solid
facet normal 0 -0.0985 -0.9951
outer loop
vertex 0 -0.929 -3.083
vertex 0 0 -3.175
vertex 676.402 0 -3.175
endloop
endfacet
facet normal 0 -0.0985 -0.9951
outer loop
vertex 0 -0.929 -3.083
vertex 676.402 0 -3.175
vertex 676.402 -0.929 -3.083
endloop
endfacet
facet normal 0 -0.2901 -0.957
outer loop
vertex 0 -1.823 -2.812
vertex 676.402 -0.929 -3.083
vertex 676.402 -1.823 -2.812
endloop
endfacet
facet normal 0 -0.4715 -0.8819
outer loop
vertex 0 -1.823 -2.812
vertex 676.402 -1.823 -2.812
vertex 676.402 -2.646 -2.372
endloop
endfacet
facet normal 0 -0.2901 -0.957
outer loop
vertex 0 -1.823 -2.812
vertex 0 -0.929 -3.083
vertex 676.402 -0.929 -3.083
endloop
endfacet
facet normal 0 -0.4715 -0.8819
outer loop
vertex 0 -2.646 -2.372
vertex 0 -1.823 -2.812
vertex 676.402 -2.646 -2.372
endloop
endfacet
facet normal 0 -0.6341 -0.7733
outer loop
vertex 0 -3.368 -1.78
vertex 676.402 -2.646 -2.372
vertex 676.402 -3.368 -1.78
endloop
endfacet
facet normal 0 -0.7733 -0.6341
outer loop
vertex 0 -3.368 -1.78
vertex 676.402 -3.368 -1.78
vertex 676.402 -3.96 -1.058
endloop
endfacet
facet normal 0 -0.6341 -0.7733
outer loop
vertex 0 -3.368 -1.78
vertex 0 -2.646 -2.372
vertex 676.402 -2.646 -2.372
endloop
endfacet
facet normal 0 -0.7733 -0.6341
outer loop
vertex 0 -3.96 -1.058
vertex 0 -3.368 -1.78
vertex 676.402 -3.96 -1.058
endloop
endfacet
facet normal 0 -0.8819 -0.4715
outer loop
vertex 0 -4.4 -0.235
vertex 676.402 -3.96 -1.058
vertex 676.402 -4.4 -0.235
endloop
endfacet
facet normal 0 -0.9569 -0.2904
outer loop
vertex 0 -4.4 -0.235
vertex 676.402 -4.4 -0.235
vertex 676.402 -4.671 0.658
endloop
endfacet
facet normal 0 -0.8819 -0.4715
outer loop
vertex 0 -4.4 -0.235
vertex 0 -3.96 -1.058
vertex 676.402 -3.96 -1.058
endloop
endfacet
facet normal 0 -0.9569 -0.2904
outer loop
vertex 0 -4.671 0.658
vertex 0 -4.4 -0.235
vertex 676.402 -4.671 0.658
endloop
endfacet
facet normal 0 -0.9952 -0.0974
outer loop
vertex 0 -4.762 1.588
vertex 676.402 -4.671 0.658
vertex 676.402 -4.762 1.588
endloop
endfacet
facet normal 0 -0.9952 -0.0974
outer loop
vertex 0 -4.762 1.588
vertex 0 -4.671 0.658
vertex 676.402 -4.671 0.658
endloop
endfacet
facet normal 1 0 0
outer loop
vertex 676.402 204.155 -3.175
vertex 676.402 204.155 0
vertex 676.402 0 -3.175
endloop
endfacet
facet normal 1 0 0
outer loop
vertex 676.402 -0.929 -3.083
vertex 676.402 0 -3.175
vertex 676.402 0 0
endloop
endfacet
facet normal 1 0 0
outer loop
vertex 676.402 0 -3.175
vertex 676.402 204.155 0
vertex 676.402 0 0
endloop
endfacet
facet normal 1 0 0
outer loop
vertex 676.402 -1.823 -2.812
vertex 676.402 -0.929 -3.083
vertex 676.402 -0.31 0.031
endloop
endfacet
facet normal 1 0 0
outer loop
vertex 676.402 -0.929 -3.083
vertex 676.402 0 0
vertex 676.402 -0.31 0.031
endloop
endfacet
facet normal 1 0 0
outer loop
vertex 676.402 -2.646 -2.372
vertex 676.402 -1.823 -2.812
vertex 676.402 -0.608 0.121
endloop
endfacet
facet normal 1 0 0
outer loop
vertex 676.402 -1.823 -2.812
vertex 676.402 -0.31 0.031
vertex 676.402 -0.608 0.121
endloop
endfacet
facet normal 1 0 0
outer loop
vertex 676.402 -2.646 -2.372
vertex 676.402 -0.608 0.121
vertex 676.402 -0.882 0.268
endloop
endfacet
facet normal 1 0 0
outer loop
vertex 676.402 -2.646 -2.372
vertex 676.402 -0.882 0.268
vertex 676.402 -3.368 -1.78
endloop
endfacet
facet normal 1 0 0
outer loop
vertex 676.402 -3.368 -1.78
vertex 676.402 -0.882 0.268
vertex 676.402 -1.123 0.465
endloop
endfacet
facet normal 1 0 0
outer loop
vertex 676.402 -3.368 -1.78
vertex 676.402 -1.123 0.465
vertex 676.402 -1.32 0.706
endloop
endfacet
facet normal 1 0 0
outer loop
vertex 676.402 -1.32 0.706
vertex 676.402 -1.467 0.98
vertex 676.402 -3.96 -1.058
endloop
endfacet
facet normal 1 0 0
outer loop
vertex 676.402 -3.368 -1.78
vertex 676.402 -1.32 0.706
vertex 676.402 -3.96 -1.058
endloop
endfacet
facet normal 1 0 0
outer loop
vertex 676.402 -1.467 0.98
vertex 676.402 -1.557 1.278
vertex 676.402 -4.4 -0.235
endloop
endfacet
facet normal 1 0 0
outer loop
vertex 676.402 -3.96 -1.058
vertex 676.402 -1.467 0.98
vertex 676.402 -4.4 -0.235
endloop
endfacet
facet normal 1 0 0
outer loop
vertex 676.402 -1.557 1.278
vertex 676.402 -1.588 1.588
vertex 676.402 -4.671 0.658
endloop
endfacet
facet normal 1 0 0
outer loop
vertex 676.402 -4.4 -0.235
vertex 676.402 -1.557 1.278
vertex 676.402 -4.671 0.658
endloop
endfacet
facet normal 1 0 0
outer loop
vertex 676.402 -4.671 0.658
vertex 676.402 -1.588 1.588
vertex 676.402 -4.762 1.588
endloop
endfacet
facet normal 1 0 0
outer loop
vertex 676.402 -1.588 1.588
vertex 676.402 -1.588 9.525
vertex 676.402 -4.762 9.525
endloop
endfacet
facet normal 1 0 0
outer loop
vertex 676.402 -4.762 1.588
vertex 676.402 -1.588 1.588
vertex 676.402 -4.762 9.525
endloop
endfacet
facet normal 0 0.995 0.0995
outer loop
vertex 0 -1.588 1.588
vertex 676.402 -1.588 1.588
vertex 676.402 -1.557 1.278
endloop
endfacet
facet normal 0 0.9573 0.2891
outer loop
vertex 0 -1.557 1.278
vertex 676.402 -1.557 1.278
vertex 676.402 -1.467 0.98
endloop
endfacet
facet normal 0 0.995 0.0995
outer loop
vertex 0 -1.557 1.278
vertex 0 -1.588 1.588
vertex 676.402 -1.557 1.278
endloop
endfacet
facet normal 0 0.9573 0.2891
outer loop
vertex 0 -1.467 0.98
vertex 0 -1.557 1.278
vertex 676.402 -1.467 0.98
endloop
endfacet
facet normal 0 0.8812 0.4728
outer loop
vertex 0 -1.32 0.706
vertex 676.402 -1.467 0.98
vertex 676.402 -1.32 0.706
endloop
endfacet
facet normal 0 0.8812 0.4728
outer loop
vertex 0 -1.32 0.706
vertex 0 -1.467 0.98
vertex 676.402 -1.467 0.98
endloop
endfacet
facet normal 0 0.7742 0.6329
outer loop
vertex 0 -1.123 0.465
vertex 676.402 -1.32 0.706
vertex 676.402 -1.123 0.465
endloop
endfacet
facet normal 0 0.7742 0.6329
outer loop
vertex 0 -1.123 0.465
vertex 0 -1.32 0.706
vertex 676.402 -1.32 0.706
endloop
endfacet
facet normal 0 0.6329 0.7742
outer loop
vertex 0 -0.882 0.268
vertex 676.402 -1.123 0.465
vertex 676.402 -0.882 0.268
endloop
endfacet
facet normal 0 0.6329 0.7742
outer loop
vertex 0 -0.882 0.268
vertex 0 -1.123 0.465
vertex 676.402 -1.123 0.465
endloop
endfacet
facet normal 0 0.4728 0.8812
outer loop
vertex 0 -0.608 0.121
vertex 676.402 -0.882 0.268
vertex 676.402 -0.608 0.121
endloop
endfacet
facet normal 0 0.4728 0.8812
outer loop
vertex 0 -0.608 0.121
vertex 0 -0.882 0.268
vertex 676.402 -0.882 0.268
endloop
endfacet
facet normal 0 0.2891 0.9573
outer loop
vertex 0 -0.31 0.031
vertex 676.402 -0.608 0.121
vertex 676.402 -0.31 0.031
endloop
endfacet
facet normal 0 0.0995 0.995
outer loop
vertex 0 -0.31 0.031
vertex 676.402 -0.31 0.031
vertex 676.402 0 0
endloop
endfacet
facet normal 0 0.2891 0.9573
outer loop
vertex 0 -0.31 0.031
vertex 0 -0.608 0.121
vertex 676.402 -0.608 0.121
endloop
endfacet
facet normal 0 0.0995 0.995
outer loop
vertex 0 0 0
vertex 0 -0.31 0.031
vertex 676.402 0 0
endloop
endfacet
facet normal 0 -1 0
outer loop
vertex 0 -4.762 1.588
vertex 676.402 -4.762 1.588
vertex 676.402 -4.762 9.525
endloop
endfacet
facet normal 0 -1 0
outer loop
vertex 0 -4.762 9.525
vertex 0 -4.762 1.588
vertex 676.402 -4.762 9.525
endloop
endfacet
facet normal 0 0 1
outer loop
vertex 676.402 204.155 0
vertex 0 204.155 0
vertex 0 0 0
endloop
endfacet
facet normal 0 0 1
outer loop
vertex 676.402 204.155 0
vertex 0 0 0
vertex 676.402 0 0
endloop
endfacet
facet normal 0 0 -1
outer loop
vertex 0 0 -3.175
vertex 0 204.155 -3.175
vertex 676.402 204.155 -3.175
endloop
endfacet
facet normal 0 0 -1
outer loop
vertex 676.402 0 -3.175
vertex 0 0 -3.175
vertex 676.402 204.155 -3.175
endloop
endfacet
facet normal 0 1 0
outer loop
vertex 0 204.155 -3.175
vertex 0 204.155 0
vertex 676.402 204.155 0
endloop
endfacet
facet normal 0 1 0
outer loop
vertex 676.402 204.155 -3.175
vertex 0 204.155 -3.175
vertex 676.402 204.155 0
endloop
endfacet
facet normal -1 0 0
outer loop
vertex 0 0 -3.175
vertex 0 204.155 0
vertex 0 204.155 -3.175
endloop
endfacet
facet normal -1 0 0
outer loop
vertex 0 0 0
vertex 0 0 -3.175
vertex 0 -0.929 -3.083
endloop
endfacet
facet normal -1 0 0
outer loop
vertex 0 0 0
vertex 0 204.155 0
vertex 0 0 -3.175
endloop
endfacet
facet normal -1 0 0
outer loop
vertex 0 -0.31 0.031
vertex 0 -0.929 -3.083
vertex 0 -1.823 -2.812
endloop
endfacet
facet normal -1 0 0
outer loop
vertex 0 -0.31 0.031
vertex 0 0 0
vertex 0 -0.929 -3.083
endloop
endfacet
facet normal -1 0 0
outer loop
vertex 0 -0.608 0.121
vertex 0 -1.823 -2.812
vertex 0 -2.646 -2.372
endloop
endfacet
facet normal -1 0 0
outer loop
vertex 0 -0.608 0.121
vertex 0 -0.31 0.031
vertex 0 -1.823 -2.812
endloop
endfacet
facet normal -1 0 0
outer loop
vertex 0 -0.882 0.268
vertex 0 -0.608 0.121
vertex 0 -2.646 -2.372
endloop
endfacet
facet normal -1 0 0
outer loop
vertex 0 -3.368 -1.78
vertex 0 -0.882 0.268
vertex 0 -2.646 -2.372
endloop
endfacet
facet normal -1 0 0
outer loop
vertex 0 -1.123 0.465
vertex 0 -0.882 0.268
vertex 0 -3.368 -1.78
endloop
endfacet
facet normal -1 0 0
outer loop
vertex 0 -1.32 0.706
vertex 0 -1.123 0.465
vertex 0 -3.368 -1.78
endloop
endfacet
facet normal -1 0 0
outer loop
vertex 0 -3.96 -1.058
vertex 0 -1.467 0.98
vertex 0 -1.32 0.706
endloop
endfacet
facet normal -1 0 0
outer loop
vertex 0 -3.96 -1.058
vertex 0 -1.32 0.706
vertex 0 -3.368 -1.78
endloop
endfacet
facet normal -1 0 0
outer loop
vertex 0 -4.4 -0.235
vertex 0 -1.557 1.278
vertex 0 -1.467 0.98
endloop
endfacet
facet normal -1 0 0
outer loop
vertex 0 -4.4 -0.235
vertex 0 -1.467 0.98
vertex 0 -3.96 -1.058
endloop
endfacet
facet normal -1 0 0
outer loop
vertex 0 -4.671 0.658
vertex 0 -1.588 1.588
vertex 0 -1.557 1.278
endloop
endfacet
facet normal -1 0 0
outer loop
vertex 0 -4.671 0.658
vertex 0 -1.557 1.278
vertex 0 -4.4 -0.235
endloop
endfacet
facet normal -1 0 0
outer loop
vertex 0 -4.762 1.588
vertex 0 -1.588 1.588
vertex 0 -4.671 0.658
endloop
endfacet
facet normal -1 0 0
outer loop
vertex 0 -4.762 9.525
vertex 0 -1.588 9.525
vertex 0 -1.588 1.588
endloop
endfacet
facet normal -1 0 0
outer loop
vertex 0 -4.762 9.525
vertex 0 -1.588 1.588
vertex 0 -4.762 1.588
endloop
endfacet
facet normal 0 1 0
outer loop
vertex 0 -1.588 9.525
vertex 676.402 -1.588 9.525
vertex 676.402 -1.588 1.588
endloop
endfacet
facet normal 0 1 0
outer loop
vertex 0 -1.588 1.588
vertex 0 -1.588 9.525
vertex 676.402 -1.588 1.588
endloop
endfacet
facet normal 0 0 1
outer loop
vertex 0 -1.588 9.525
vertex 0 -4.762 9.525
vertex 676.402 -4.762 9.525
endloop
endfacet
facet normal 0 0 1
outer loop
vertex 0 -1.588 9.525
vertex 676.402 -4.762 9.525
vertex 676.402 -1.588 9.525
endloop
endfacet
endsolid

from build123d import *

# Parameters (mm, degrees)
SKETCH1_W          = 676.402
SKETCH1_H          = 204.15504
BASE_FLANGE1_DEPTH = 3.175
EDGE_FLANGE1_DEPTH = 676.402
SKETCH9_R          = 9.525
CUT_EXTRUDE1_DEPTH = 3.175


# Sheet-metal steps are written as plain solids
with BuildPart() as part:
    # Sketch1 → Base-Flange1 (new body)
    with BuildSketch(Plane.XY):
        with Locations((338.201, 102.07752)):
            Rectangle(SKETCH1_W, SKETCH1_H)
    extrude(amount=-BASE_FLANGE1_DEPTH)

    # Edge-Flange1 section (across the edge) → Edge-Flange1 (add)
    with BuildSketch(Plane(origin=(0, -1.5875, 0), x_dir=(0, 1, 0), z_dir=(1, 0, 0))):
        with BuildLine():
            Line((-3.175, 1.5875), (-3.175, 9.525))
            Line((-3.175, 9.525), (0, 9.525))
            Line((0, 9.525), (0, 1.5875))
            ThreePointArc((0, 1.5875), (0.464967985, 0.464967985), (1.5875, 0))
            Line((1.5875, 0), (1.5875, -3.175))
            ThreePointArc((1.5875, -3.175), (-1.780096045, -1.780096045), (-3.175, 1.5875))
        make_face()
    extrude(amount=EDGE_FLANGE1_DEPTH)

    # Sketch9 → Cut-Extrude1 (cut)
    with BuildSketch(Plane(origin=(0, 0, 1.251039998), x_dir=(-1, 0, 0), z_dir=(0, 0, -1))):
        with Locations((-267.508853456, 43.732259818)):
            Circle(SKETCH9_R)
        with Locations((-180.176306543, 43.732259818)):
            Circle(SKETCH9_R)
        with Locations((-38.908853456, 43.732259818)):
            Circle(SKETCH9_R)
        with Locations((-637.376306543, 43.732259818)):
            Circle(SKETCH9_R)
        with Locations((-496.108853456, 43.732259818)):
            Circle(SKETCH9_R)
        with Locations((-408.776306543, 43.732259818)):
            Circle(SKETCH9_R)
        with Locations((-38.908853456, 163.597780182)):
            Circle(SKETCH9_R)
        with Locations((-180.176306543, 163.597780182)):
            Circle(SKETCH9_R)
        with Locations((-408.776306543, 163.597780182)):
            Circle(SKETCH9_R)
        with Locations((-267.508853456, 163.597780182)):
            Circle(SKETCH9_R)
        with Locations((-637.376306543, 163.597780182)):
            Circle(SKETCH9_R)
        with Locations((-496.108853456, 163.597780182)):
            Circle(SKETCH9_R)
    extrude(amount=-CUT_EXTRUDE1_DEPTH, mode=Mode.SUBTRACT)


solid = part.part
